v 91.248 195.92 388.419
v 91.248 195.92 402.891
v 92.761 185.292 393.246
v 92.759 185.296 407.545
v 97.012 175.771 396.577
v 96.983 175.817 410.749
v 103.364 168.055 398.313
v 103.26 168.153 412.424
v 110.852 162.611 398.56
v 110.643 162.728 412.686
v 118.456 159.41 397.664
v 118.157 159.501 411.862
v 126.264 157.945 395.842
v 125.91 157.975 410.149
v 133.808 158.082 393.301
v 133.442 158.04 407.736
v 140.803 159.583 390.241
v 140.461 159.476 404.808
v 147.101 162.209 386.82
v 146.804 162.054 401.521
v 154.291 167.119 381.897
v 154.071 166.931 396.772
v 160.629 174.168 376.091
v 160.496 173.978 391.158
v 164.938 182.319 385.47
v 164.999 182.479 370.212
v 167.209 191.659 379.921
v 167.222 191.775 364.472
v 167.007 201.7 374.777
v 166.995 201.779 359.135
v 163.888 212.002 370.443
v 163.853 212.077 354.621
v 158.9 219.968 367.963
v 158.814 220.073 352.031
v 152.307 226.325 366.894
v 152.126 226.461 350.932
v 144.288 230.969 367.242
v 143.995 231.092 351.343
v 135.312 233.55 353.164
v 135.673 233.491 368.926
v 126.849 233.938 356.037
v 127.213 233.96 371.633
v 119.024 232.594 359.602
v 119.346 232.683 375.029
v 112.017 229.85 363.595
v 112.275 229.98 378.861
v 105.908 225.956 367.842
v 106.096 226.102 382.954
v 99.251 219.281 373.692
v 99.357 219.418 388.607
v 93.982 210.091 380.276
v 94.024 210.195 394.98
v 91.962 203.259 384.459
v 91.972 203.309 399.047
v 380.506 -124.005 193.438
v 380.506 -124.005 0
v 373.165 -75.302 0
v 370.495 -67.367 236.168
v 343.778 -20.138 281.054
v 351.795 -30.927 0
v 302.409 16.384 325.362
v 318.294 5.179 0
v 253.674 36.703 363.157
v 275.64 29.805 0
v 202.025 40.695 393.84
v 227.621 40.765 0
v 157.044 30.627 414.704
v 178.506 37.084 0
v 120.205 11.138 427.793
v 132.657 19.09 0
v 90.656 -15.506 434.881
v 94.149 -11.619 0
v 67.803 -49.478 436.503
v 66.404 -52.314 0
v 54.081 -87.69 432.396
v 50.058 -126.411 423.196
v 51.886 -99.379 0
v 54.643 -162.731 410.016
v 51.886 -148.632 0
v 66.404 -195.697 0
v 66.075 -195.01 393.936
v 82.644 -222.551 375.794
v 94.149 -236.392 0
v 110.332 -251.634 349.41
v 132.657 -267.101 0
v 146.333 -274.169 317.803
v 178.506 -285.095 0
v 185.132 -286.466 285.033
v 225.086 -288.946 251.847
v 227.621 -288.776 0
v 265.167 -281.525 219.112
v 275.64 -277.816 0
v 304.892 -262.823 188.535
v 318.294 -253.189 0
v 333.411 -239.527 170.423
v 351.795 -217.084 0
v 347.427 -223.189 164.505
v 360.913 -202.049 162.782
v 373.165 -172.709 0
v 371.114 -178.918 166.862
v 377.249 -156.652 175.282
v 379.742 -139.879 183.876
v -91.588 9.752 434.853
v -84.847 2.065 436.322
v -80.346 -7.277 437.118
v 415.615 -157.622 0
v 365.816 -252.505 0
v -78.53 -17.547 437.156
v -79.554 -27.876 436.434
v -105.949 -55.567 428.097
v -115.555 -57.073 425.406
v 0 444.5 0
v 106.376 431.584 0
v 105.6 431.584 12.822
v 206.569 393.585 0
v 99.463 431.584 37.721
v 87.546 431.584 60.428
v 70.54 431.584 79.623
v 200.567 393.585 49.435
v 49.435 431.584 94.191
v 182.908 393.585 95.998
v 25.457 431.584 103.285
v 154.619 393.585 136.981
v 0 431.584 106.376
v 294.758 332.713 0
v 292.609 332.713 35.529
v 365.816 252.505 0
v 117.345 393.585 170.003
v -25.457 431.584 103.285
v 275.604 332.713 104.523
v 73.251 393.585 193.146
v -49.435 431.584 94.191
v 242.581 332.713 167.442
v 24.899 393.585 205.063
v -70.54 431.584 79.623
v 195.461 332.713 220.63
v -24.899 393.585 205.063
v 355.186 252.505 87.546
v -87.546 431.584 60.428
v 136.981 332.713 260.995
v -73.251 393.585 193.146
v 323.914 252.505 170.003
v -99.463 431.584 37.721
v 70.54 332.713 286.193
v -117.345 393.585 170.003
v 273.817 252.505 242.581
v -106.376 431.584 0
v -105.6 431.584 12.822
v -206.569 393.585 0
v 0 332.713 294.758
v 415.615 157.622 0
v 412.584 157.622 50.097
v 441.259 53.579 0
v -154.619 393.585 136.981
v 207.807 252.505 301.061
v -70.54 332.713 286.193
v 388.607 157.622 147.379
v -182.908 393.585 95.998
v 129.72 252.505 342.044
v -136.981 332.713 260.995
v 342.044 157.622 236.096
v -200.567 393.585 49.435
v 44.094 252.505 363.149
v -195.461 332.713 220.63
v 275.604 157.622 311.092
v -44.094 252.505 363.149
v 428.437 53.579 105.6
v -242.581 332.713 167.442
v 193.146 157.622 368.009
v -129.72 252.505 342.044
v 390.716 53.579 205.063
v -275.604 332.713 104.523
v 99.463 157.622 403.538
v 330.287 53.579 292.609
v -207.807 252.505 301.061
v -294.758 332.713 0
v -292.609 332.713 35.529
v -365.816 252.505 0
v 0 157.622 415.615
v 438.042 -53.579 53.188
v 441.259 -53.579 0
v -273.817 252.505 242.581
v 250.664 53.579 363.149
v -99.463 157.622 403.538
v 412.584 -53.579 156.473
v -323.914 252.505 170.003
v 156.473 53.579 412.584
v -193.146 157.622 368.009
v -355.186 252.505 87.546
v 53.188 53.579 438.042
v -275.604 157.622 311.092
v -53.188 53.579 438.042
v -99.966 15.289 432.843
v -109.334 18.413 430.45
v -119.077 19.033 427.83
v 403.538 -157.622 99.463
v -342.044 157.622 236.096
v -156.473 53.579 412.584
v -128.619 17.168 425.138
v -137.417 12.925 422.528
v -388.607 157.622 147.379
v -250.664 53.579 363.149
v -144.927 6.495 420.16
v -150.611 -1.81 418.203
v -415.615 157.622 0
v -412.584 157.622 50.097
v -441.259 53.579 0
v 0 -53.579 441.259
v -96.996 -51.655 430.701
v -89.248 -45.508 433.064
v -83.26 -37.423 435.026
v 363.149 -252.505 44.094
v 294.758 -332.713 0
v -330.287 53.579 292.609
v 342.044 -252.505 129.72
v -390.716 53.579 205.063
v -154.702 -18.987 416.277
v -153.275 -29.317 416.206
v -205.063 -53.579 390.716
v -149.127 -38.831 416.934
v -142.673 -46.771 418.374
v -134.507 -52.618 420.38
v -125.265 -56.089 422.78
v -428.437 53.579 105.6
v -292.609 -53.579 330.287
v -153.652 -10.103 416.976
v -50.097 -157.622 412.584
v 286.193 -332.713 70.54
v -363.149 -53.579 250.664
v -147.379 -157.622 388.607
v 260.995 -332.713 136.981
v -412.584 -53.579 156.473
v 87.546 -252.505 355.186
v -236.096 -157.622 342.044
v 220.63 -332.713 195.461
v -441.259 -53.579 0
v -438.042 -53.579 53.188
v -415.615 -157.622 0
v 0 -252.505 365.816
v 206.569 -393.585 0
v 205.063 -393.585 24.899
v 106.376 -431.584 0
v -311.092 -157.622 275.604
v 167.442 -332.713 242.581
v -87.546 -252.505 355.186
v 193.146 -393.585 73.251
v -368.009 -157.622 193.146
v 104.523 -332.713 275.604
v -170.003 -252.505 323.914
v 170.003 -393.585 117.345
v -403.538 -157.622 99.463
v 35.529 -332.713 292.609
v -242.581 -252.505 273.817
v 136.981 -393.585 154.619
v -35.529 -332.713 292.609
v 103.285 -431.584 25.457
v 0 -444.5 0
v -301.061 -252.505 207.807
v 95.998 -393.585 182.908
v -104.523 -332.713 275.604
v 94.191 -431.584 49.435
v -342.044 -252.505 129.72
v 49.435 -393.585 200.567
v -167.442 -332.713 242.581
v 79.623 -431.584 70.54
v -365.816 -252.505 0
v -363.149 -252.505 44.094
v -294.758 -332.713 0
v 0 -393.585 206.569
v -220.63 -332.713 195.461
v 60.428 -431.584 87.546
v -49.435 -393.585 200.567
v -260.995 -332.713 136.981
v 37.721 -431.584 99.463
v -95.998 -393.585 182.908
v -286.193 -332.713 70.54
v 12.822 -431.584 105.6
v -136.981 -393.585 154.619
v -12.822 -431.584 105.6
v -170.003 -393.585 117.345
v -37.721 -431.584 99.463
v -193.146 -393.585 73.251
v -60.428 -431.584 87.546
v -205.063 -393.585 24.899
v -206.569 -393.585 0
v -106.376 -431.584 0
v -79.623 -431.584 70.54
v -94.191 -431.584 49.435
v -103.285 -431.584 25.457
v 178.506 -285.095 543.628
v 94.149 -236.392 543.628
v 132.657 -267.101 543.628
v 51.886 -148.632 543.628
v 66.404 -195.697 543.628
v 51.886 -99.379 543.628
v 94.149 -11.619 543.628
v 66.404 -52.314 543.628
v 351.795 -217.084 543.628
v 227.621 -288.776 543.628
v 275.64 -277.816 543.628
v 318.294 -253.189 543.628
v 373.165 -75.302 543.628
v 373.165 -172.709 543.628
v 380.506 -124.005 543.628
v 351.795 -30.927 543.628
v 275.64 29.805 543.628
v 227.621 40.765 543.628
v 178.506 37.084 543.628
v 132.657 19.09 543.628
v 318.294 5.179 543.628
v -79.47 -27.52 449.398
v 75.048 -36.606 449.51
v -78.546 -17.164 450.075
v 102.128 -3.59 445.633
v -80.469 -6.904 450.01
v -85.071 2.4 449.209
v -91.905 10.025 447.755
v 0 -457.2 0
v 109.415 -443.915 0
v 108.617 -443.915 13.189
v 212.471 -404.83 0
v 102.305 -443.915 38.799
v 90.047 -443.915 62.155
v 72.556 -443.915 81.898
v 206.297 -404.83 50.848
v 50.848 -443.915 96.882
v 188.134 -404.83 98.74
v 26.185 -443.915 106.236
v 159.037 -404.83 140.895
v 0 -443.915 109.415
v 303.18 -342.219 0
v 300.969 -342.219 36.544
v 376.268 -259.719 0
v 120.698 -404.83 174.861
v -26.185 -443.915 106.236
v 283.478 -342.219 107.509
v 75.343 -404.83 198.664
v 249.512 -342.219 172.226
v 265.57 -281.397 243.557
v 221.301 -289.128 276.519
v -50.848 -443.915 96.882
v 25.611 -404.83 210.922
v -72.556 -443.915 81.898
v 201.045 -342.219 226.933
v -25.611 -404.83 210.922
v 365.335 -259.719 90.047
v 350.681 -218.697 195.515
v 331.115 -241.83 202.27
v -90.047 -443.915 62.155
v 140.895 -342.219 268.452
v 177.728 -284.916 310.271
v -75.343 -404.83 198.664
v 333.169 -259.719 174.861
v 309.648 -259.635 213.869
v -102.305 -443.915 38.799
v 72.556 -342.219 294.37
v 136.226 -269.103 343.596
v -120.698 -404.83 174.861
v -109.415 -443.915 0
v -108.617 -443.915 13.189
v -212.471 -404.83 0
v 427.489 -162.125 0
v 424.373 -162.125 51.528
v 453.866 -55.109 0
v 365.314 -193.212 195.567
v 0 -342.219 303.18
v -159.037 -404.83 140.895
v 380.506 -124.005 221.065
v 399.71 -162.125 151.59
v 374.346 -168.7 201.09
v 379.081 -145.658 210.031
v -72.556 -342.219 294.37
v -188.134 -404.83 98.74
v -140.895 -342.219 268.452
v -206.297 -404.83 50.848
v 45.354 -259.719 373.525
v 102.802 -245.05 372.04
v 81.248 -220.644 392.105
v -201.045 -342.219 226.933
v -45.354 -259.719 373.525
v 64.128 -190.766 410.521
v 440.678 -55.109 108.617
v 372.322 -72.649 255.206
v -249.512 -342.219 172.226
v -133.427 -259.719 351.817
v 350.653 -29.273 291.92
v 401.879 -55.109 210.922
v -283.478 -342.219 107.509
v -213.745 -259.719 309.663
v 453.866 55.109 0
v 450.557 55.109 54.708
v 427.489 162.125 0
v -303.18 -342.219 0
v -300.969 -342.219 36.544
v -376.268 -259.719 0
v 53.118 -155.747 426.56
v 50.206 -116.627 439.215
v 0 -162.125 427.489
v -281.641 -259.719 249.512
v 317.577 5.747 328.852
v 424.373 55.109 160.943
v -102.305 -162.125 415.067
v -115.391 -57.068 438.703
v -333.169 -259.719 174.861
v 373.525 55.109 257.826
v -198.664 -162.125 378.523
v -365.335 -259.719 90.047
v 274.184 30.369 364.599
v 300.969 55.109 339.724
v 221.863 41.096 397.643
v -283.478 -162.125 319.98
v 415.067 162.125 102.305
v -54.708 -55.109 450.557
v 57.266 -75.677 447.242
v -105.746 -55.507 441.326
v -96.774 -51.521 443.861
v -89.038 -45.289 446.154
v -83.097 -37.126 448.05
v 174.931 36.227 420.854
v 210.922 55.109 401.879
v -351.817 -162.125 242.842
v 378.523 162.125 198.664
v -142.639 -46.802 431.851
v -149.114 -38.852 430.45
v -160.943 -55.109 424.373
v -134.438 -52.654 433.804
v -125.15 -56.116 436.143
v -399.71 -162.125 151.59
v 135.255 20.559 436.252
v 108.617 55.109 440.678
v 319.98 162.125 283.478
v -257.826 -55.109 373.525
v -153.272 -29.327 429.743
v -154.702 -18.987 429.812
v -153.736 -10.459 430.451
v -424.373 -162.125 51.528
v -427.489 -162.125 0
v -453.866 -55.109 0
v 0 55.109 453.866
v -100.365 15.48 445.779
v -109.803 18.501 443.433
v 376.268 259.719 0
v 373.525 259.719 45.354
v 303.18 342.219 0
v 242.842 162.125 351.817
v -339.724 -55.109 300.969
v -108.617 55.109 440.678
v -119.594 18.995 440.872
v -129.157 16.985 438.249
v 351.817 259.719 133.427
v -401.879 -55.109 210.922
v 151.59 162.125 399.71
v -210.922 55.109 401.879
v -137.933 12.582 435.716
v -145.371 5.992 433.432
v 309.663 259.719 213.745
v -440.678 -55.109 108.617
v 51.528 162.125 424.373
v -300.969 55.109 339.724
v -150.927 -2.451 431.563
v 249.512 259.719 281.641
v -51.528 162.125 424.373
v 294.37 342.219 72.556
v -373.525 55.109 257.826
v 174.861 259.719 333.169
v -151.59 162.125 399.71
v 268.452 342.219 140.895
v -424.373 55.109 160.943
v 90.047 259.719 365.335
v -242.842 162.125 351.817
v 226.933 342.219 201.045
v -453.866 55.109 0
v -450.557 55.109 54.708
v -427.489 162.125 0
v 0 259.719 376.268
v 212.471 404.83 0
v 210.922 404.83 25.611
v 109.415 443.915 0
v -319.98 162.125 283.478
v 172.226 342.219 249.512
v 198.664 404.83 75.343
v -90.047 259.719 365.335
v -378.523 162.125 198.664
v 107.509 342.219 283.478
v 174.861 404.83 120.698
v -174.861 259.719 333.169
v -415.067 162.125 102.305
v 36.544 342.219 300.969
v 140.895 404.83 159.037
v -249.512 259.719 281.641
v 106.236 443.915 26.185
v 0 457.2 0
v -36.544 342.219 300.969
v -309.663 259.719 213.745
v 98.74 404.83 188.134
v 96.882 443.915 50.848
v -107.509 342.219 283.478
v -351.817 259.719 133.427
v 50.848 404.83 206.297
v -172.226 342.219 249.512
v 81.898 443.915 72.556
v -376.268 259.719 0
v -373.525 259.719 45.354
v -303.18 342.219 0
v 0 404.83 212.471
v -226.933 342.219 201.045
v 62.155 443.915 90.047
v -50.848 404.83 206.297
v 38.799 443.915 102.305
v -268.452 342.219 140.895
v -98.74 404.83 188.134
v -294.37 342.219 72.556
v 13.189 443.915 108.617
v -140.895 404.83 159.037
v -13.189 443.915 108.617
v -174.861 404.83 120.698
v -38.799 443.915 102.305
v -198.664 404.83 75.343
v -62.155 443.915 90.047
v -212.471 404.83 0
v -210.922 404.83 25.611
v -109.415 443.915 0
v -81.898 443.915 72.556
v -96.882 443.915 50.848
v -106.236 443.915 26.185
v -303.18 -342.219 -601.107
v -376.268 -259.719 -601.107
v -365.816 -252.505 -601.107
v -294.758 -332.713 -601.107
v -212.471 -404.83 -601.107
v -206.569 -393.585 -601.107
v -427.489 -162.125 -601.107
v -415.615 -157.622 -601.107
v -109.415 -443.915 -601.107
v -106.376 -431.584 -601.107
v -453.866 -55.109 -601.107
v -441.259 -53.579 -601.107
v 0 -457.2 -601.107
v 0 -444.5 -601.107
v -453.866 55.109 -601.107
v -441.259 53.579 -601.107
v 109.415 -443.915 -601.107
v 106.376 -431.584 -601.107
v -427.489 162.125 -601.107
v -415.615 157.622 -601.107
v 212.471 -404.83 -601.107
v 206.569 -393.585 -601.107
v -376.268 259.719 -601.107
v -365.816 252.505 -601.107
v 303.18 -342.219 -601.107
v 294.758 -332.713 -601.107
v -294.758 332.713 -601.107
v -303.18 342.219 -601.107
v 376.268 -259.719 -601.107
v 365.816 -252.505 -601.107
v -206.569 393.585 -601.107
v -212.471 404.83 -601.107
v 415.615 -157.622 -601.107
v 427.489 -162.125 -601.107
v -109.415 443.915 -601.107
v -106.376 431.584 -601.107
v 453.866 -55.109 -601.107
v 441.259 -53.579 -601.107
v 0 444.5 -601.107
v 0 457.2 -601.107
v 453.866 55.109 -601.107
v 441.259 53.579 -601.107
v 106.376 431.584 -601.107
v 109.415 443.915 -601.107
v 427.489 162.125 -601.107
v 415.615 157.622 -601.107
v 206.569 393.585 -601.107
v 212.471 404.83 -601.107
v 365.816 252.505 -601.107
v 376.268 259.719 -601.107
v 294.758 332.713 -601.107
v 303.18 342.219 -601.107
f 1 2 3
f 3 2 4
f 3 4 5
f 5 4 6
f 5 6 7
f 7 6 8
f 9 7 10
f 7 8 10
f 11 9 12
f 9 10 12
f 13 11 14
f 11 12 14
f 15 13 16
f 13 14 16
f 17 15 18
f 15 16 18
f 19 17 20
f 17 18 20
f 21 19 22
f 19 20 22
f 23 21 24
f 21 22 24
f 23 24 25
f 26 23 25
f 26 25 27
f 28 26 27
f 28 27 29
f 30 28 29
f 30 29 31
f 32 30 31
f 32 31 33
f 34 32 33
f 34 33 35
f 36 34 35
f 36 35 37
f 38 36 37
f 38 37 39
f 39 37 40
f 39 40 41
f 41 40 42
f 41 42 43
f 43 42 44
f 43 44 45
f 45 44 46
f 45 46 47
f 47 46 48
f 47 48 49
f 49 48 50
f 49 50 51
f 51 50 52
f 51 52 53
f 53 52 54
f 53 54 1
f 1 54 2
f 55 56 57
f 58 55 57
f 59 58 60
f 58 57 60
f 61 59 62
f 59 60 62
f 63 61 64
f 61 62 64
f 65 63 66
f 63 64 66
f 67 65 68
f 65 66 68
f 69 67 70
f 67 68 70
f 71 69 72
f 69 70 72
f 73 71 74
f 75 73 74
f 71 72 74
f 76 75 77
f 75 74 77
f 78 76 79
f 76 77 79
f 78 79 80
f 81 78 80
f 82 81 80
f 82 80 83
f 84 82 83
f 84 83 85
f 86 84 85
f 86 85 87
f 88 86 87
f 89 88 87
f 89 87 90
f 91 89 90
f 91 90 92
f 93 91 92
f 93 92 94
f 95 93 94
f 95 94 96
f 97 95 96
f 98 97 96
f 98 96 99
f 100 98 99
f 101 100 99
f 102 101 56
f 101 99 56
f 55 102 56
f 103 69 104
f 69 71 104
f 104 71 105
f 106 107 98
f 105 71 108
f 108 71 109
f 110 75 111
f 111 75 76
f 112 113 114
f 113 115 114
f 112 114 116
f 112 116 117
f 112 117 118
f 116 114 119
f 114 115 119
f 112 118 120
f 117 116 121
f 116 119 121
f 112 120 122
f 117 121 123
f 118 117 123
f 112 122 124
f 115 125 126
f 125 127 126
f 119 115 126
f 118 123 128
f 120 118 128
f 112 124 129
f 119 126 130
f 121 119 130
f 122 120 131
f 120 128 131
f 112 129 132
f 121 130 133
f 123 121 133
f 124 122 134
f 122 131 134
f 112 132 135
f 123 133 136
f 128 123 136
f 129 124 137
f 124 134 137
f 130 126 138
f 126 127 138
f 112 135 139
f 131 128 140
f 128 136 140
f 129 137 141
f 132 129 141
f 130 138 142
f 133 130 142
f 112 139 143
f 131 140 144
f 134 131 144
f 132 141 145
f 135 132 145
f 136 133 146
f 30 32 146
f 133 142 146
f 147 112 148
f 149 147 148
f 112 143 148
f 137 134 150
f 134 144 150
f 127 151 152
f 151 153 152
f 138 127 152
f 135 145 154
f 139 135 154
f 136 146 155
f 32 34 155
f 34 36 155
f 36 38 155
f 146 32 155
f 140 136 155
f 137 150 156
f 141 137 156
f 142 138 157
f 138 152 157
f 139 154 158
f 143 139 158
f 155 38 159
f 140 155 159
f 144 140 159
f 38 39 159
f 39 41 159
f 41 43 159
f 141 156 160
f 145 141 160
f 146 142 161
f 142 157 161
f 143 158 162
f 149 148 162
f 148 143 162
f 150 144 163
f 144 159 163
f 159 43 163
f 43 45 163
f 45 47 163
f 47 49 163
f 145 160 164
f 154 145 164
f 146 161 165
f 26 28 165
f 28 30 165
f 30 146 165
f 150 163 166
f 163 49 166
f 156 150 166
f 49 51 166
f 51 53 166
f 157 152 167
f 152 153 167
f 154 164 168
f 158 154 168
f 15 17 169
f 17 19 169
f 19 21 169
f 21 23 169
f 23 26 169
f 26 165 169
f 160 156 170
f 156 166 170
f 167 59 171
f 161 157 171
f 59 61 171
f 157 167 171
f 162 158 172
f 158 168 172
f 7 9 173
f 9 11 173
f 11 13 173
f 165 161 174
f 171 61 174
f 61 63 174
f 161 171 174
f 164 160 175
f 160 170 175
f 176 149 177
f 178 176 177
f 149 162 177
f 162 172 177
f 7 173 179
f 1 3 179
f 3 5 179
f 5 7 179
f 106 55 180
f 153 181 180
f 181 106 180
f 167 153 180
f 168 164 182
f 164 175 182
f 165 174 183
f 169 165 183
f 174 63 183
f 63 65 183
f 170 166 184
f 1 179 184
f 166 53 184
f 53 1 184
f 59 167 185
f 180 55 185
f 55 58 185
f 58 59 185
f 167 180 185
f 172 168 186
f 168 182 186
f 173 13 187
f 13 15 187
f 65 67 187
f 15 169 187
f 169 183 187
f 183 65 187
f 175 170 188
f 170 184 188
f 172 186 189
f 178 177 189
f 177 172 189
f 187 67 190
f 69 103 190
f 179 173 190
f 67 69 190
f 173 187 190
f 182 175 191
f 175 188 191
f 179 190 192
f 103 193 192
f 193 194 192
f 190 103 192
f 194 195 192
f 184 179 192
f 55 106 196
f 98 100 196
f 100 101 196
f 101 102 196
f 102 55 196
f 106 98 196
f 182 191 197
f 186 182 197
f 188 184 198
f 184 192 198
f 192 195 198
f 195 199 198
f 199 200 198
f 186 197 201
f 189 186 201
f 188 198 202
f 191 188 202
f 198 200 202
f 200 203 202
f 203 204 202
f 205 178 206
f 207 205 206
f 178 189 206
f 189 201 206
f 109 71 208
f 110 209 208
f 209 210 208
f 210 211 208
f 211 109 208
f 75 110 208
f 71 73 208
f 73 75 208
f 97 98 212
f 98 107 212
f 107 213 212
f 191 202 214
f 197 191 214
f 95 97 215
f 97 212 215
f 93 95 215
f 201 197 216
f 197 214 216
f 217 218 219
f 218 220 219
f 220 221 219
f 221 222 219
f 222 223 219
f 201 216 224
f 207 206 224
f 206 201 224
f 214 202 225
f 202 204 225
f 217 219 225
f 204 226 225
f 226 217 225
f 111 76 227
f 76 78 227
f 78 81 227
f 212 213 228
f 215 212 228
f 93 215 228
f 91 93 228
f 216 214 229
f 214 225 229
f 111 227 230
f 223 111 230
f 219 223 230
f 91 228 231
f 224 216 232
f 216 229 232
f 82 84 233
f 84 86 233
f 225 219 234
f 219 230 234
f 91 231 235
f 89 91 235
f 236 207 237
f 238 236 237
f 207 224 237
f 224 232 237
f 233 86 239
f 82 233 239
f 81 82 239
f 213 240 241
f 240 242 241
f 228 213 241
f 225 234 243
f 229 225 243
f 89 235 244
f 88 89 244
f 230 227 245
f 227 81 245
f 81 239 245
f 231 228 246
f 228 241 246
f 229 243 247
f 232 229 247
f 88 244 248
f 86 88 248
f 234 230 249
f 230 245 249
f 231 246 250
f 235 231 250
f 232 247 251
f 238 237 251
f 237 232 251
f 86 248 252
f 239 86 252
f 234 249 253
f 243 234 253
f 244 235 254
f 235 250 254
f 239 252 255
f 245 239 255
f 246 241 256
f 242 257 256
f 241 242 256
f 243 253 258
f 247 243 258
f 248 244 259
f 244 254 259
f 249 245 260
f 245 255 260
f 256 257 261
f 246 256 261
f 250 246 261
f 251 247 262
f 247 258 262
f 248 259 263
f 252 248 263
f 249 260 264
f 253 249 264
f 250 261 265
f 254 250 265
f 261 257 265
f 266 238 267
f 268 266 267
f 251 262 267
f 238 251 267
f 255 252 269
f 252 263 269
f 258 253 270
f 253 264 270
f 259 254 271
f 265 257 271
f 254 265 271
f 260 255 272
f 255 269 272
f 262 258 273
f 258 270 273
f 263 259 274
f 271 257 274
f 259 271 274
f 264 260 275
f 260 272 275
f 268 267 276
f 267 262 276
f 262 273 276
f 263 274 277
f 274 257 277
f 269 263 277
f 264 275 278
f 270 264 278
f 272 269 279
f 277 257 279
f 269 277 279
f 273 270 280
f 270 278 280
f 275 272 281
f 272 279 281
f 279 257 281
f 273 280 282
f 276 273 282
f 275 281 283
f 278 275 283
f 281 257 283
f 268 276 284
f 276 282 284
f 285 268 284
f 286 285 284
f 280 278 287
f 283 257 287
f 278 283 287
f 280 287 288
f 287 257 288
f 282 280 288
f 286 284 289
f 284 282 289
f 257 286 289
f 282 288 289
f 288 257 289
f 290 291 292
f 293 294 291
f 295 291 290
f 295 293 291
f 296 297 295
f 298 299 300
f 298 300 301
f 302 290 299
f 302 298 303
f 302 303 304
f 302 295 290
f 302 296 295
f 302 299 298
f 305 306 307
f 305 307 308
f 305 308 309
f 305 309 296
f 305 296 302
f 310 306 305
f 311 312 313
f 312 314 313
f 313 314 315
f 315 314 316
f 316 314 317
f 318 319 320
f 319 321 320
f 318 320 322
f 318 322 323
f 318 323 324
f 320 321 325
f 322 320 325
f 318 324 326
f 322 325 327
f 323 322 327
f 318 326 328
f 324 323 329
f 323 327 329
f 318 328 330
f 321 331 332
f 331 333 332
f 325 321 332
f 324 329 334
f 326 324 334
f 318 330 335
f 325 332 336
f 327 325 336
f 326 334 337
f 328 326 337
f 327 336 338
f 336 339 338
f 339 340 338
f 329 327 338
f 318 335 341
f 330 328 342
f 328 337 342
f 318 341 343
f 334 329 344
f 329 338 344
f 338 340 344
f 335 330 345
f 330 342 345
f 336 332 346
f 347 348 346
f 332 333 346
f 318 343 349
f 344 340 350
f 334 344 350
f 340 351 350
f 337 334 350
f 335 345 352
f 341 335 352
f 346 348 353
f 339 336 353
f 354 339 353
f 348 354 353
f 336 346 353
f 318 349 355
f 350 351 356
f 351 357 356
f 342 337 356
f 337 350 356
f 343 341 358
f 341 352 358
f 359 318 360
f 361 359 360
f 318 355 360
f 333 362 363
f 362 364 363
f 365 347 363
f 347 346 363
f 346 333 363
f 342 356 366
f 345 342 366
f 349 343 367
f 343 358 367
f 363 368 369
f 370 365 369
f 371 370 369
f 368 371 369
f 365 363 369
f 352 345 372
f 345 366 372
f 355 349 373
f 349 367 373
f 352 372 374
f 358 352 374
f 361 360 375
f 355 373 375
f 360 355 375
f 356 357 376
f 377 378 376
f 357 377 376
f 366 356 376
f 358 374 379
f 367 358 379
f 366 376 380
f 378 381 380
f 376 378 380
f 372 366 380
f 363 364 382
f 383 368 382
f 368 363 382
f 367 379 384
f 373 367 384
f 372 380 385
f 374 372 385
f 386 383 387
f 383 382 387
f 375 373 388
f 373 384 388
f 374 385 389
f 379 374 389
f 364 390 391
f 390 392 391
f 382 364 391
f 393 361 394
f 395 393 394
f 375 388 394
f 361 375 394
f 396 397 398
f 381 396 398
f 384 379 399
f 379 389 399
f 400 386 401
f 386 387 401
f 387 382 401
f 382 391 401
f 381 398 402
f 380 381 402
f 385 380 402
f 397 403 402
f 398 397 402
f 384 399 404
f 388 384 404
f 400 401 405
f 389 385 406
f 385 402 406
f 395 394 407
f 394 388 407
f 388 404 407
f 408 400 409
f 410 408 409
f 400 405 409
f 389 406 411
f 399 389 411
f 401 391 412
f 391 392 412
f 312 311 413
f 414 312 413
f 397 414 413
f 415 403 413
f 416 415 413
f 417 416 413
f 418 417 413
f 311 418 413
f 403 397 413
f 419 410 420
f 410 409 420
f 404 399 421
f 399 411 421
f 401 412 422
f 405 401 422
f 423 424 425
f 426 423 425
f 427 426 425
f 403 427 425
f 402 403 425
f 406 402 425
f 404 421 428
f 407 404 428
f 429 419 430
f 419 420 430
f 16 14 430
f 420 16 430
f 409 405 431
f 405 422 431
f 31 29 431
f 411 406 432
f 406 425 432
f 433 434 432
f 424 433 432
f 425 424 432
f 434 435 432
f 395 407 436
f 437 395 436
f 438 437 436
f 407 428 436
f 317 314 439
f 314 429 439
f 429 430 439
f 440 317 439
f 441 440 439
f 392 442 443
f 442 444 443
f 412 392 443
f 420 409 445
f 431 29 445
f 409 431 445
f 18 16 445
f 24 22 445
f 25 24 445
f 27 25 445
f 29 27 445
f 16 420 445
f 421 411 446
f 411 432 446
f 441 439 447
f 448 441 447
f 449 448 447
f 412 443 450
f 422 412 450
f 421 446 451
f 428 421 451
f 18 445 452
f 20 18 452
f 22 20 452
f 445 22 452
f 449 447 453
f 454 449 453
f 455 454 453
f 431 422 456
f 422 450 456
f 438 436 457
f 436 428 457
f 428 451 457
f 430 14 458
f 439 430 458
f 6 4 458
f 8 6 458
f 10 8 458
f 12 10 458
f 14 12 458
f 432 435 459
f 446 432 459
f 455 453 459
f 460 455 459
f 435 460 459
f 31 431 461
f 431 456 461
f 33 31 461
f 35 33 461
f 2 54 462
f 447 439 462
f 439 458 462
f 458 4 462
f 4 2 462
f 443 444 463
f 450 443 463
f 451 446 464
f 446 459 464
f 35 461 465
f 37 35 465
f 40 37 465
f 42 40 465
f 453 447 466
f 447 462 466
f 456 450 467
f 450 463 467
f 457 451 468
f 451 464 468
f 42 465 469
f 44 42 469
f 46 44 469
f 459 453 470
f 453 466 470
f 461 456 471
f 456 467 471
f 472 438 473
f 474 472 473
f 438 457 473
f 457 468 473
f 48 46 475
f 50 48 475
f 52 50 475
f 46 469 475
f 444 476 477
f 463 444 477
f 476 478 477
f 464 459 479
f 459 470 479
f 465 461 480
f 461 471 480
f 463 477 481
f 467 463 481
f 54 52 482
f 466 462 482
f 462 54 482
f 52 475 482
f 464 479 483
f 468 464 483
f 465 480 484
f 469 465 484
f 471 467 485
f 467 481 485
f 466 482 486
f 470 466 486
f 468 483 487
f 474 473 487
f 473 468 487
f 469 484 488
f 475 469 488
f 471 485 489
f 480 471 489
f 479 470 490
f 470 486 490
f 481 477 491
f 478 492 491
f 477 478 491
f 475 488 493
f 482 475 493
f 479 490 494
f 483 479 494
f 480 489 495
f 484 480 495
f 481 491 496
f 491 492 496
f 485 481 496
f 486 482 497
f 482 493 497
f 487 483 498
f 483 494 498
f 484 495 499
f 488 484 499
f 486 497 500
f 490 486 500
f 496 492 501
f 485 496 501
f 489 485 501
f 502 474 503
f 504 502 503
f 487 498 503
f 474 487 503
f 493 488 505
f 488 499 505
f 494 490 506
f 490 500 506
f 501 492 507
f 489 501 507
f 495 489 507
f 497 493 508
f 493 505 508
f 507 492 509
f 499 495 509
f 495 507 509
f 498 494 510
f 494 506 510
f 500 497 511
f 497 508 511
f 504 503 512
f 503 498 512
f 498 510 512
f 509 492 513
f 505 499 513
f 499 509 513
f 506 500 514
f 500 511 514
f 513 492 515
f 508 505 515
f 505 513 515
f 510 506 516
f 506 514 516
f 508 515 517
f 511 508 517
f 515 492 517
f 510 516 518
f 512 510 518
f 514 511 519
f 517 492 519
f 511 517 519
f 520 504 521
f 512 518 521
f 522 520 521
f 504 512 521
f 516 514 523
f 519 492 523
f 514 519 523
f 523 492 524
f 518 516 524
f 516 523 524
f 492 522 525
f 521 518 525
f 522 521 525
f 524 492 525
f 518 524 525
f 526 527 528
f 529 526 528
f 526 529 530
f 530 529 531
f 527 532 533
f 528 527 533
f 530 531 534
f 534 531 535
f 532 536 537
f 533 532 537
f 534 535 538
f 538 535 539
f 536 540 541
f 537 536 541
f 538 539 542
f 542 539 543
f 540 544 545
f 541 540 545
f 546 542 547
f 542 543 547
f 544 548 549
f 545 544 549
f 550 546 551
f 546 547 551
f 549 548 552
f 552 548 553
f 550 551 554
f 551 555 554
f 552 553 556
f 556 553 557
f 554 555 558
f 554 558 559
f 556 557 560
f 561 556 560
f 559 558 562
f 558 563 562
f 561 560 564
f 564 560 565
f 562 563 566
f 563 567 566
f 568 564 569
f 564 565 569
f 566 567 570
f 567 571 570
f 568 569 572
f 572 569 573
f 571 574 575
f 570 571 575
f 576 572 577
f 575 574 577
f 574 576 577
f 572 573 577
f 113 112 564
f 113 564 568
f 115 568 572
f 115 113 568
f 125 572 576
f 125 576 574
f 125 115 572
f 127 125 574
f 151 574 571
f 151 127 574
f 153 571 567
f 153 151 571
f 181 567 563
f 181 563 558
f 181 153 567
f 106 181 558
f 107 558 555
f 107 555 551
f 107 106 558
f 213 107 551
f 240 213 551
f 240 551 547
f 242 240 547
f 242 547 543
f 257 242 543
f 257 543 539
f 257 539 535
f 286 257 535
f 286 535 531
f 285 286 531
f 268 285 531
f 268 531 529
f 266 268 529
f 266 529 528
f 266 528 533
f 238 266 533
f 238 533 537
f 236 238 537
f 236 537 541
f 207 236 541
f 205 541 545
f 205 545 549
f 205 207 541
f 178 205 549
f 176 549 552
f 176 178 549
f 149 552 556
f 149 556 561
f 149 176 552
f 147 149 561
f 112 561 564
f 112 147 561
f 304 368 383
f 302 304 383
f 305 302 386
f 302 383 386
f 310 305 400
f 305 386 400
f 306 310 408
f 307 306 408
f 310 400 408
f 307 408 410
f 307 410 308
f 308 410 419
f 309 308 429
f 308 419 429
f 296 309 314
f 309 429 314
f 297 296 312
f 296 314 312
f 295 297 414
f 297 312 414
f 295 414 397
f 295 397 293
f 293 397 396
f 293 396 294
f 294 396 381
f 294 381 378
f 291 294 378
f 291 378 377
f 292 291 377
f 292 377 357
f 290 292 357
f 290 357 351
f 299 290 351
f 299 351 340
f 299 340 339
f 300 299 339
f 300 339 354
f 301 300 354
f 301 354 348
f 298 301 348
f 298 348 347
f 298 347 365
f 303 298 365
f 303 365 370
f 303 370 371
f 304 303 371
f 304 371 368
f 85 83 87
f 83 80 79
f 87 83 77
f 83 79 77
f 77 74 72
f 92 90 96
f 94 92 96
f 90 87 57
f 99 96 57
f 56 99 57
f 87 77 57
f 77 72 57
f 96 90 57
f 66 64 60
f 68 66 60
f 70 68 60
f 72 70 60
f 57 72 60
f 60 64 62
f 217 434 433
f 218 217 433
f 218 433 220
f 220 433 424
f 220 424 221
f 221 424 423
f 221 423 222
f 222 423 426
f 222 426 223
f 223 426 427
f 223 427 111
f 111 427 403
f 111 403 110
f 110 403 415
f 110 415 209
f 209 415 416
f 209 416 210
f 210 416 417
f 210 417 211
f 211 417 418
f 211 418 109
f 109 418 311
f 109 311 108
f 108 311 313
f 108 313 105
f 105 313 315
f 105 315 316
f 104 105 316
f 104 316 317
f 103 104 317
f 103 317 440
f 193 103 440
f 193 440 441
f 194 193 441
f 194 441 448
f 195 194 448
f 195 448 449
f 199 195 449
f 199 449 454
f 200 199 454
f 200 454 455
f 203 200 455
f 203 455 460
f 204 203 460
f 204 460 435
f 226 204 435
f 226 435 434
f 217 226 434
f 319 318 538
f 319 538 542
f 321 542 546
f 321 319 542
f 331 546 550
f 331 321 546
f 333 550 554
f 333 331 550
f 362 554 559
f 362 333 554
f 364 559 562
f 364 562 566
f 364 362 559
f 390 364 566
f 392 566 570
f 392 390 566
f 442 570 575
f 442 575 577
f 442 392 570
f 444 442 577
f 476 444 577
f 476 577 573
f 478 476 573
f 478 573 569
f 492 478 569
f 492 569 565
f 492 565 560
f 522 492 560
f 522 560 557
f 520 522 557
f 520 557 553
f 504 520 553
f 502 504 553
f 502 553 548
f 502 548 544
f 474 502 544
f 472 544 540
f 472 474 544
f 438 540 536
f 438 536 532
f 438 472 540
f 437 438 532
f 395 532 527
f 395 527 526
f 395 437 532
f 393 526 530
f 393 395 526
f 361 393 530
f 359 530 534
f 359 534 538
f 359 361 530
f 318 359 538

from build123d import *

# Parameters (mm, degrees)
F1_ANGLE = 180
F3_D     = 76.2
F4_R     = 165.2325510481
F5_DEPTH = 543.62825
F6_DEPTH = 601.10694


with BuildPart() as f1:
    # F0 (on Top) → F1 (revolve)
    with BuildSketch(Plane.XY):
        with BuildLine():
            Line((0, -444.5), (0, -457.2))
            ThreePointArc((0, -457.2), (457.2, 0), (0, 457.2))
            Line((0, 457.2), (0, 444.5))
            ThreePointArc((0, 444.5), (444.5, 0), (0, -444.5))
        make_face()
    revolve(axis=Axis((0, 0, 0), (0, -1, 0)), revolution_arc=F1_ANGLE)

    # F3 (through all)
    with Locations(Plane(origin=(0, 0, 0), x_dir=(1, 0, 0), z_dir=(0, 0, -1))):
        with Locations((-116.6023164988, 18.9869366586), (129.3481886387, -195.9198415279), (215.2733206749, 124.0054294467)):
            Hole(F3_D / 2)

    # F4 (on Top) → F5 (join)
    with BuildSketch(Plane.XY):
        with Locations((215.2733206749, -124.0054294467)):
            Circle(F4_R)
    extrude(amount=F5_DEPTH)

    # F6 (add): a face of the model
    f6_faces = [f1.faces().sort_by_distance(p)[0] for p in [
        (445.7931568814, 0, 0),
    ]]
    extrude(f6_faces, amount=F6_DEPTH)


solid = f1.part
